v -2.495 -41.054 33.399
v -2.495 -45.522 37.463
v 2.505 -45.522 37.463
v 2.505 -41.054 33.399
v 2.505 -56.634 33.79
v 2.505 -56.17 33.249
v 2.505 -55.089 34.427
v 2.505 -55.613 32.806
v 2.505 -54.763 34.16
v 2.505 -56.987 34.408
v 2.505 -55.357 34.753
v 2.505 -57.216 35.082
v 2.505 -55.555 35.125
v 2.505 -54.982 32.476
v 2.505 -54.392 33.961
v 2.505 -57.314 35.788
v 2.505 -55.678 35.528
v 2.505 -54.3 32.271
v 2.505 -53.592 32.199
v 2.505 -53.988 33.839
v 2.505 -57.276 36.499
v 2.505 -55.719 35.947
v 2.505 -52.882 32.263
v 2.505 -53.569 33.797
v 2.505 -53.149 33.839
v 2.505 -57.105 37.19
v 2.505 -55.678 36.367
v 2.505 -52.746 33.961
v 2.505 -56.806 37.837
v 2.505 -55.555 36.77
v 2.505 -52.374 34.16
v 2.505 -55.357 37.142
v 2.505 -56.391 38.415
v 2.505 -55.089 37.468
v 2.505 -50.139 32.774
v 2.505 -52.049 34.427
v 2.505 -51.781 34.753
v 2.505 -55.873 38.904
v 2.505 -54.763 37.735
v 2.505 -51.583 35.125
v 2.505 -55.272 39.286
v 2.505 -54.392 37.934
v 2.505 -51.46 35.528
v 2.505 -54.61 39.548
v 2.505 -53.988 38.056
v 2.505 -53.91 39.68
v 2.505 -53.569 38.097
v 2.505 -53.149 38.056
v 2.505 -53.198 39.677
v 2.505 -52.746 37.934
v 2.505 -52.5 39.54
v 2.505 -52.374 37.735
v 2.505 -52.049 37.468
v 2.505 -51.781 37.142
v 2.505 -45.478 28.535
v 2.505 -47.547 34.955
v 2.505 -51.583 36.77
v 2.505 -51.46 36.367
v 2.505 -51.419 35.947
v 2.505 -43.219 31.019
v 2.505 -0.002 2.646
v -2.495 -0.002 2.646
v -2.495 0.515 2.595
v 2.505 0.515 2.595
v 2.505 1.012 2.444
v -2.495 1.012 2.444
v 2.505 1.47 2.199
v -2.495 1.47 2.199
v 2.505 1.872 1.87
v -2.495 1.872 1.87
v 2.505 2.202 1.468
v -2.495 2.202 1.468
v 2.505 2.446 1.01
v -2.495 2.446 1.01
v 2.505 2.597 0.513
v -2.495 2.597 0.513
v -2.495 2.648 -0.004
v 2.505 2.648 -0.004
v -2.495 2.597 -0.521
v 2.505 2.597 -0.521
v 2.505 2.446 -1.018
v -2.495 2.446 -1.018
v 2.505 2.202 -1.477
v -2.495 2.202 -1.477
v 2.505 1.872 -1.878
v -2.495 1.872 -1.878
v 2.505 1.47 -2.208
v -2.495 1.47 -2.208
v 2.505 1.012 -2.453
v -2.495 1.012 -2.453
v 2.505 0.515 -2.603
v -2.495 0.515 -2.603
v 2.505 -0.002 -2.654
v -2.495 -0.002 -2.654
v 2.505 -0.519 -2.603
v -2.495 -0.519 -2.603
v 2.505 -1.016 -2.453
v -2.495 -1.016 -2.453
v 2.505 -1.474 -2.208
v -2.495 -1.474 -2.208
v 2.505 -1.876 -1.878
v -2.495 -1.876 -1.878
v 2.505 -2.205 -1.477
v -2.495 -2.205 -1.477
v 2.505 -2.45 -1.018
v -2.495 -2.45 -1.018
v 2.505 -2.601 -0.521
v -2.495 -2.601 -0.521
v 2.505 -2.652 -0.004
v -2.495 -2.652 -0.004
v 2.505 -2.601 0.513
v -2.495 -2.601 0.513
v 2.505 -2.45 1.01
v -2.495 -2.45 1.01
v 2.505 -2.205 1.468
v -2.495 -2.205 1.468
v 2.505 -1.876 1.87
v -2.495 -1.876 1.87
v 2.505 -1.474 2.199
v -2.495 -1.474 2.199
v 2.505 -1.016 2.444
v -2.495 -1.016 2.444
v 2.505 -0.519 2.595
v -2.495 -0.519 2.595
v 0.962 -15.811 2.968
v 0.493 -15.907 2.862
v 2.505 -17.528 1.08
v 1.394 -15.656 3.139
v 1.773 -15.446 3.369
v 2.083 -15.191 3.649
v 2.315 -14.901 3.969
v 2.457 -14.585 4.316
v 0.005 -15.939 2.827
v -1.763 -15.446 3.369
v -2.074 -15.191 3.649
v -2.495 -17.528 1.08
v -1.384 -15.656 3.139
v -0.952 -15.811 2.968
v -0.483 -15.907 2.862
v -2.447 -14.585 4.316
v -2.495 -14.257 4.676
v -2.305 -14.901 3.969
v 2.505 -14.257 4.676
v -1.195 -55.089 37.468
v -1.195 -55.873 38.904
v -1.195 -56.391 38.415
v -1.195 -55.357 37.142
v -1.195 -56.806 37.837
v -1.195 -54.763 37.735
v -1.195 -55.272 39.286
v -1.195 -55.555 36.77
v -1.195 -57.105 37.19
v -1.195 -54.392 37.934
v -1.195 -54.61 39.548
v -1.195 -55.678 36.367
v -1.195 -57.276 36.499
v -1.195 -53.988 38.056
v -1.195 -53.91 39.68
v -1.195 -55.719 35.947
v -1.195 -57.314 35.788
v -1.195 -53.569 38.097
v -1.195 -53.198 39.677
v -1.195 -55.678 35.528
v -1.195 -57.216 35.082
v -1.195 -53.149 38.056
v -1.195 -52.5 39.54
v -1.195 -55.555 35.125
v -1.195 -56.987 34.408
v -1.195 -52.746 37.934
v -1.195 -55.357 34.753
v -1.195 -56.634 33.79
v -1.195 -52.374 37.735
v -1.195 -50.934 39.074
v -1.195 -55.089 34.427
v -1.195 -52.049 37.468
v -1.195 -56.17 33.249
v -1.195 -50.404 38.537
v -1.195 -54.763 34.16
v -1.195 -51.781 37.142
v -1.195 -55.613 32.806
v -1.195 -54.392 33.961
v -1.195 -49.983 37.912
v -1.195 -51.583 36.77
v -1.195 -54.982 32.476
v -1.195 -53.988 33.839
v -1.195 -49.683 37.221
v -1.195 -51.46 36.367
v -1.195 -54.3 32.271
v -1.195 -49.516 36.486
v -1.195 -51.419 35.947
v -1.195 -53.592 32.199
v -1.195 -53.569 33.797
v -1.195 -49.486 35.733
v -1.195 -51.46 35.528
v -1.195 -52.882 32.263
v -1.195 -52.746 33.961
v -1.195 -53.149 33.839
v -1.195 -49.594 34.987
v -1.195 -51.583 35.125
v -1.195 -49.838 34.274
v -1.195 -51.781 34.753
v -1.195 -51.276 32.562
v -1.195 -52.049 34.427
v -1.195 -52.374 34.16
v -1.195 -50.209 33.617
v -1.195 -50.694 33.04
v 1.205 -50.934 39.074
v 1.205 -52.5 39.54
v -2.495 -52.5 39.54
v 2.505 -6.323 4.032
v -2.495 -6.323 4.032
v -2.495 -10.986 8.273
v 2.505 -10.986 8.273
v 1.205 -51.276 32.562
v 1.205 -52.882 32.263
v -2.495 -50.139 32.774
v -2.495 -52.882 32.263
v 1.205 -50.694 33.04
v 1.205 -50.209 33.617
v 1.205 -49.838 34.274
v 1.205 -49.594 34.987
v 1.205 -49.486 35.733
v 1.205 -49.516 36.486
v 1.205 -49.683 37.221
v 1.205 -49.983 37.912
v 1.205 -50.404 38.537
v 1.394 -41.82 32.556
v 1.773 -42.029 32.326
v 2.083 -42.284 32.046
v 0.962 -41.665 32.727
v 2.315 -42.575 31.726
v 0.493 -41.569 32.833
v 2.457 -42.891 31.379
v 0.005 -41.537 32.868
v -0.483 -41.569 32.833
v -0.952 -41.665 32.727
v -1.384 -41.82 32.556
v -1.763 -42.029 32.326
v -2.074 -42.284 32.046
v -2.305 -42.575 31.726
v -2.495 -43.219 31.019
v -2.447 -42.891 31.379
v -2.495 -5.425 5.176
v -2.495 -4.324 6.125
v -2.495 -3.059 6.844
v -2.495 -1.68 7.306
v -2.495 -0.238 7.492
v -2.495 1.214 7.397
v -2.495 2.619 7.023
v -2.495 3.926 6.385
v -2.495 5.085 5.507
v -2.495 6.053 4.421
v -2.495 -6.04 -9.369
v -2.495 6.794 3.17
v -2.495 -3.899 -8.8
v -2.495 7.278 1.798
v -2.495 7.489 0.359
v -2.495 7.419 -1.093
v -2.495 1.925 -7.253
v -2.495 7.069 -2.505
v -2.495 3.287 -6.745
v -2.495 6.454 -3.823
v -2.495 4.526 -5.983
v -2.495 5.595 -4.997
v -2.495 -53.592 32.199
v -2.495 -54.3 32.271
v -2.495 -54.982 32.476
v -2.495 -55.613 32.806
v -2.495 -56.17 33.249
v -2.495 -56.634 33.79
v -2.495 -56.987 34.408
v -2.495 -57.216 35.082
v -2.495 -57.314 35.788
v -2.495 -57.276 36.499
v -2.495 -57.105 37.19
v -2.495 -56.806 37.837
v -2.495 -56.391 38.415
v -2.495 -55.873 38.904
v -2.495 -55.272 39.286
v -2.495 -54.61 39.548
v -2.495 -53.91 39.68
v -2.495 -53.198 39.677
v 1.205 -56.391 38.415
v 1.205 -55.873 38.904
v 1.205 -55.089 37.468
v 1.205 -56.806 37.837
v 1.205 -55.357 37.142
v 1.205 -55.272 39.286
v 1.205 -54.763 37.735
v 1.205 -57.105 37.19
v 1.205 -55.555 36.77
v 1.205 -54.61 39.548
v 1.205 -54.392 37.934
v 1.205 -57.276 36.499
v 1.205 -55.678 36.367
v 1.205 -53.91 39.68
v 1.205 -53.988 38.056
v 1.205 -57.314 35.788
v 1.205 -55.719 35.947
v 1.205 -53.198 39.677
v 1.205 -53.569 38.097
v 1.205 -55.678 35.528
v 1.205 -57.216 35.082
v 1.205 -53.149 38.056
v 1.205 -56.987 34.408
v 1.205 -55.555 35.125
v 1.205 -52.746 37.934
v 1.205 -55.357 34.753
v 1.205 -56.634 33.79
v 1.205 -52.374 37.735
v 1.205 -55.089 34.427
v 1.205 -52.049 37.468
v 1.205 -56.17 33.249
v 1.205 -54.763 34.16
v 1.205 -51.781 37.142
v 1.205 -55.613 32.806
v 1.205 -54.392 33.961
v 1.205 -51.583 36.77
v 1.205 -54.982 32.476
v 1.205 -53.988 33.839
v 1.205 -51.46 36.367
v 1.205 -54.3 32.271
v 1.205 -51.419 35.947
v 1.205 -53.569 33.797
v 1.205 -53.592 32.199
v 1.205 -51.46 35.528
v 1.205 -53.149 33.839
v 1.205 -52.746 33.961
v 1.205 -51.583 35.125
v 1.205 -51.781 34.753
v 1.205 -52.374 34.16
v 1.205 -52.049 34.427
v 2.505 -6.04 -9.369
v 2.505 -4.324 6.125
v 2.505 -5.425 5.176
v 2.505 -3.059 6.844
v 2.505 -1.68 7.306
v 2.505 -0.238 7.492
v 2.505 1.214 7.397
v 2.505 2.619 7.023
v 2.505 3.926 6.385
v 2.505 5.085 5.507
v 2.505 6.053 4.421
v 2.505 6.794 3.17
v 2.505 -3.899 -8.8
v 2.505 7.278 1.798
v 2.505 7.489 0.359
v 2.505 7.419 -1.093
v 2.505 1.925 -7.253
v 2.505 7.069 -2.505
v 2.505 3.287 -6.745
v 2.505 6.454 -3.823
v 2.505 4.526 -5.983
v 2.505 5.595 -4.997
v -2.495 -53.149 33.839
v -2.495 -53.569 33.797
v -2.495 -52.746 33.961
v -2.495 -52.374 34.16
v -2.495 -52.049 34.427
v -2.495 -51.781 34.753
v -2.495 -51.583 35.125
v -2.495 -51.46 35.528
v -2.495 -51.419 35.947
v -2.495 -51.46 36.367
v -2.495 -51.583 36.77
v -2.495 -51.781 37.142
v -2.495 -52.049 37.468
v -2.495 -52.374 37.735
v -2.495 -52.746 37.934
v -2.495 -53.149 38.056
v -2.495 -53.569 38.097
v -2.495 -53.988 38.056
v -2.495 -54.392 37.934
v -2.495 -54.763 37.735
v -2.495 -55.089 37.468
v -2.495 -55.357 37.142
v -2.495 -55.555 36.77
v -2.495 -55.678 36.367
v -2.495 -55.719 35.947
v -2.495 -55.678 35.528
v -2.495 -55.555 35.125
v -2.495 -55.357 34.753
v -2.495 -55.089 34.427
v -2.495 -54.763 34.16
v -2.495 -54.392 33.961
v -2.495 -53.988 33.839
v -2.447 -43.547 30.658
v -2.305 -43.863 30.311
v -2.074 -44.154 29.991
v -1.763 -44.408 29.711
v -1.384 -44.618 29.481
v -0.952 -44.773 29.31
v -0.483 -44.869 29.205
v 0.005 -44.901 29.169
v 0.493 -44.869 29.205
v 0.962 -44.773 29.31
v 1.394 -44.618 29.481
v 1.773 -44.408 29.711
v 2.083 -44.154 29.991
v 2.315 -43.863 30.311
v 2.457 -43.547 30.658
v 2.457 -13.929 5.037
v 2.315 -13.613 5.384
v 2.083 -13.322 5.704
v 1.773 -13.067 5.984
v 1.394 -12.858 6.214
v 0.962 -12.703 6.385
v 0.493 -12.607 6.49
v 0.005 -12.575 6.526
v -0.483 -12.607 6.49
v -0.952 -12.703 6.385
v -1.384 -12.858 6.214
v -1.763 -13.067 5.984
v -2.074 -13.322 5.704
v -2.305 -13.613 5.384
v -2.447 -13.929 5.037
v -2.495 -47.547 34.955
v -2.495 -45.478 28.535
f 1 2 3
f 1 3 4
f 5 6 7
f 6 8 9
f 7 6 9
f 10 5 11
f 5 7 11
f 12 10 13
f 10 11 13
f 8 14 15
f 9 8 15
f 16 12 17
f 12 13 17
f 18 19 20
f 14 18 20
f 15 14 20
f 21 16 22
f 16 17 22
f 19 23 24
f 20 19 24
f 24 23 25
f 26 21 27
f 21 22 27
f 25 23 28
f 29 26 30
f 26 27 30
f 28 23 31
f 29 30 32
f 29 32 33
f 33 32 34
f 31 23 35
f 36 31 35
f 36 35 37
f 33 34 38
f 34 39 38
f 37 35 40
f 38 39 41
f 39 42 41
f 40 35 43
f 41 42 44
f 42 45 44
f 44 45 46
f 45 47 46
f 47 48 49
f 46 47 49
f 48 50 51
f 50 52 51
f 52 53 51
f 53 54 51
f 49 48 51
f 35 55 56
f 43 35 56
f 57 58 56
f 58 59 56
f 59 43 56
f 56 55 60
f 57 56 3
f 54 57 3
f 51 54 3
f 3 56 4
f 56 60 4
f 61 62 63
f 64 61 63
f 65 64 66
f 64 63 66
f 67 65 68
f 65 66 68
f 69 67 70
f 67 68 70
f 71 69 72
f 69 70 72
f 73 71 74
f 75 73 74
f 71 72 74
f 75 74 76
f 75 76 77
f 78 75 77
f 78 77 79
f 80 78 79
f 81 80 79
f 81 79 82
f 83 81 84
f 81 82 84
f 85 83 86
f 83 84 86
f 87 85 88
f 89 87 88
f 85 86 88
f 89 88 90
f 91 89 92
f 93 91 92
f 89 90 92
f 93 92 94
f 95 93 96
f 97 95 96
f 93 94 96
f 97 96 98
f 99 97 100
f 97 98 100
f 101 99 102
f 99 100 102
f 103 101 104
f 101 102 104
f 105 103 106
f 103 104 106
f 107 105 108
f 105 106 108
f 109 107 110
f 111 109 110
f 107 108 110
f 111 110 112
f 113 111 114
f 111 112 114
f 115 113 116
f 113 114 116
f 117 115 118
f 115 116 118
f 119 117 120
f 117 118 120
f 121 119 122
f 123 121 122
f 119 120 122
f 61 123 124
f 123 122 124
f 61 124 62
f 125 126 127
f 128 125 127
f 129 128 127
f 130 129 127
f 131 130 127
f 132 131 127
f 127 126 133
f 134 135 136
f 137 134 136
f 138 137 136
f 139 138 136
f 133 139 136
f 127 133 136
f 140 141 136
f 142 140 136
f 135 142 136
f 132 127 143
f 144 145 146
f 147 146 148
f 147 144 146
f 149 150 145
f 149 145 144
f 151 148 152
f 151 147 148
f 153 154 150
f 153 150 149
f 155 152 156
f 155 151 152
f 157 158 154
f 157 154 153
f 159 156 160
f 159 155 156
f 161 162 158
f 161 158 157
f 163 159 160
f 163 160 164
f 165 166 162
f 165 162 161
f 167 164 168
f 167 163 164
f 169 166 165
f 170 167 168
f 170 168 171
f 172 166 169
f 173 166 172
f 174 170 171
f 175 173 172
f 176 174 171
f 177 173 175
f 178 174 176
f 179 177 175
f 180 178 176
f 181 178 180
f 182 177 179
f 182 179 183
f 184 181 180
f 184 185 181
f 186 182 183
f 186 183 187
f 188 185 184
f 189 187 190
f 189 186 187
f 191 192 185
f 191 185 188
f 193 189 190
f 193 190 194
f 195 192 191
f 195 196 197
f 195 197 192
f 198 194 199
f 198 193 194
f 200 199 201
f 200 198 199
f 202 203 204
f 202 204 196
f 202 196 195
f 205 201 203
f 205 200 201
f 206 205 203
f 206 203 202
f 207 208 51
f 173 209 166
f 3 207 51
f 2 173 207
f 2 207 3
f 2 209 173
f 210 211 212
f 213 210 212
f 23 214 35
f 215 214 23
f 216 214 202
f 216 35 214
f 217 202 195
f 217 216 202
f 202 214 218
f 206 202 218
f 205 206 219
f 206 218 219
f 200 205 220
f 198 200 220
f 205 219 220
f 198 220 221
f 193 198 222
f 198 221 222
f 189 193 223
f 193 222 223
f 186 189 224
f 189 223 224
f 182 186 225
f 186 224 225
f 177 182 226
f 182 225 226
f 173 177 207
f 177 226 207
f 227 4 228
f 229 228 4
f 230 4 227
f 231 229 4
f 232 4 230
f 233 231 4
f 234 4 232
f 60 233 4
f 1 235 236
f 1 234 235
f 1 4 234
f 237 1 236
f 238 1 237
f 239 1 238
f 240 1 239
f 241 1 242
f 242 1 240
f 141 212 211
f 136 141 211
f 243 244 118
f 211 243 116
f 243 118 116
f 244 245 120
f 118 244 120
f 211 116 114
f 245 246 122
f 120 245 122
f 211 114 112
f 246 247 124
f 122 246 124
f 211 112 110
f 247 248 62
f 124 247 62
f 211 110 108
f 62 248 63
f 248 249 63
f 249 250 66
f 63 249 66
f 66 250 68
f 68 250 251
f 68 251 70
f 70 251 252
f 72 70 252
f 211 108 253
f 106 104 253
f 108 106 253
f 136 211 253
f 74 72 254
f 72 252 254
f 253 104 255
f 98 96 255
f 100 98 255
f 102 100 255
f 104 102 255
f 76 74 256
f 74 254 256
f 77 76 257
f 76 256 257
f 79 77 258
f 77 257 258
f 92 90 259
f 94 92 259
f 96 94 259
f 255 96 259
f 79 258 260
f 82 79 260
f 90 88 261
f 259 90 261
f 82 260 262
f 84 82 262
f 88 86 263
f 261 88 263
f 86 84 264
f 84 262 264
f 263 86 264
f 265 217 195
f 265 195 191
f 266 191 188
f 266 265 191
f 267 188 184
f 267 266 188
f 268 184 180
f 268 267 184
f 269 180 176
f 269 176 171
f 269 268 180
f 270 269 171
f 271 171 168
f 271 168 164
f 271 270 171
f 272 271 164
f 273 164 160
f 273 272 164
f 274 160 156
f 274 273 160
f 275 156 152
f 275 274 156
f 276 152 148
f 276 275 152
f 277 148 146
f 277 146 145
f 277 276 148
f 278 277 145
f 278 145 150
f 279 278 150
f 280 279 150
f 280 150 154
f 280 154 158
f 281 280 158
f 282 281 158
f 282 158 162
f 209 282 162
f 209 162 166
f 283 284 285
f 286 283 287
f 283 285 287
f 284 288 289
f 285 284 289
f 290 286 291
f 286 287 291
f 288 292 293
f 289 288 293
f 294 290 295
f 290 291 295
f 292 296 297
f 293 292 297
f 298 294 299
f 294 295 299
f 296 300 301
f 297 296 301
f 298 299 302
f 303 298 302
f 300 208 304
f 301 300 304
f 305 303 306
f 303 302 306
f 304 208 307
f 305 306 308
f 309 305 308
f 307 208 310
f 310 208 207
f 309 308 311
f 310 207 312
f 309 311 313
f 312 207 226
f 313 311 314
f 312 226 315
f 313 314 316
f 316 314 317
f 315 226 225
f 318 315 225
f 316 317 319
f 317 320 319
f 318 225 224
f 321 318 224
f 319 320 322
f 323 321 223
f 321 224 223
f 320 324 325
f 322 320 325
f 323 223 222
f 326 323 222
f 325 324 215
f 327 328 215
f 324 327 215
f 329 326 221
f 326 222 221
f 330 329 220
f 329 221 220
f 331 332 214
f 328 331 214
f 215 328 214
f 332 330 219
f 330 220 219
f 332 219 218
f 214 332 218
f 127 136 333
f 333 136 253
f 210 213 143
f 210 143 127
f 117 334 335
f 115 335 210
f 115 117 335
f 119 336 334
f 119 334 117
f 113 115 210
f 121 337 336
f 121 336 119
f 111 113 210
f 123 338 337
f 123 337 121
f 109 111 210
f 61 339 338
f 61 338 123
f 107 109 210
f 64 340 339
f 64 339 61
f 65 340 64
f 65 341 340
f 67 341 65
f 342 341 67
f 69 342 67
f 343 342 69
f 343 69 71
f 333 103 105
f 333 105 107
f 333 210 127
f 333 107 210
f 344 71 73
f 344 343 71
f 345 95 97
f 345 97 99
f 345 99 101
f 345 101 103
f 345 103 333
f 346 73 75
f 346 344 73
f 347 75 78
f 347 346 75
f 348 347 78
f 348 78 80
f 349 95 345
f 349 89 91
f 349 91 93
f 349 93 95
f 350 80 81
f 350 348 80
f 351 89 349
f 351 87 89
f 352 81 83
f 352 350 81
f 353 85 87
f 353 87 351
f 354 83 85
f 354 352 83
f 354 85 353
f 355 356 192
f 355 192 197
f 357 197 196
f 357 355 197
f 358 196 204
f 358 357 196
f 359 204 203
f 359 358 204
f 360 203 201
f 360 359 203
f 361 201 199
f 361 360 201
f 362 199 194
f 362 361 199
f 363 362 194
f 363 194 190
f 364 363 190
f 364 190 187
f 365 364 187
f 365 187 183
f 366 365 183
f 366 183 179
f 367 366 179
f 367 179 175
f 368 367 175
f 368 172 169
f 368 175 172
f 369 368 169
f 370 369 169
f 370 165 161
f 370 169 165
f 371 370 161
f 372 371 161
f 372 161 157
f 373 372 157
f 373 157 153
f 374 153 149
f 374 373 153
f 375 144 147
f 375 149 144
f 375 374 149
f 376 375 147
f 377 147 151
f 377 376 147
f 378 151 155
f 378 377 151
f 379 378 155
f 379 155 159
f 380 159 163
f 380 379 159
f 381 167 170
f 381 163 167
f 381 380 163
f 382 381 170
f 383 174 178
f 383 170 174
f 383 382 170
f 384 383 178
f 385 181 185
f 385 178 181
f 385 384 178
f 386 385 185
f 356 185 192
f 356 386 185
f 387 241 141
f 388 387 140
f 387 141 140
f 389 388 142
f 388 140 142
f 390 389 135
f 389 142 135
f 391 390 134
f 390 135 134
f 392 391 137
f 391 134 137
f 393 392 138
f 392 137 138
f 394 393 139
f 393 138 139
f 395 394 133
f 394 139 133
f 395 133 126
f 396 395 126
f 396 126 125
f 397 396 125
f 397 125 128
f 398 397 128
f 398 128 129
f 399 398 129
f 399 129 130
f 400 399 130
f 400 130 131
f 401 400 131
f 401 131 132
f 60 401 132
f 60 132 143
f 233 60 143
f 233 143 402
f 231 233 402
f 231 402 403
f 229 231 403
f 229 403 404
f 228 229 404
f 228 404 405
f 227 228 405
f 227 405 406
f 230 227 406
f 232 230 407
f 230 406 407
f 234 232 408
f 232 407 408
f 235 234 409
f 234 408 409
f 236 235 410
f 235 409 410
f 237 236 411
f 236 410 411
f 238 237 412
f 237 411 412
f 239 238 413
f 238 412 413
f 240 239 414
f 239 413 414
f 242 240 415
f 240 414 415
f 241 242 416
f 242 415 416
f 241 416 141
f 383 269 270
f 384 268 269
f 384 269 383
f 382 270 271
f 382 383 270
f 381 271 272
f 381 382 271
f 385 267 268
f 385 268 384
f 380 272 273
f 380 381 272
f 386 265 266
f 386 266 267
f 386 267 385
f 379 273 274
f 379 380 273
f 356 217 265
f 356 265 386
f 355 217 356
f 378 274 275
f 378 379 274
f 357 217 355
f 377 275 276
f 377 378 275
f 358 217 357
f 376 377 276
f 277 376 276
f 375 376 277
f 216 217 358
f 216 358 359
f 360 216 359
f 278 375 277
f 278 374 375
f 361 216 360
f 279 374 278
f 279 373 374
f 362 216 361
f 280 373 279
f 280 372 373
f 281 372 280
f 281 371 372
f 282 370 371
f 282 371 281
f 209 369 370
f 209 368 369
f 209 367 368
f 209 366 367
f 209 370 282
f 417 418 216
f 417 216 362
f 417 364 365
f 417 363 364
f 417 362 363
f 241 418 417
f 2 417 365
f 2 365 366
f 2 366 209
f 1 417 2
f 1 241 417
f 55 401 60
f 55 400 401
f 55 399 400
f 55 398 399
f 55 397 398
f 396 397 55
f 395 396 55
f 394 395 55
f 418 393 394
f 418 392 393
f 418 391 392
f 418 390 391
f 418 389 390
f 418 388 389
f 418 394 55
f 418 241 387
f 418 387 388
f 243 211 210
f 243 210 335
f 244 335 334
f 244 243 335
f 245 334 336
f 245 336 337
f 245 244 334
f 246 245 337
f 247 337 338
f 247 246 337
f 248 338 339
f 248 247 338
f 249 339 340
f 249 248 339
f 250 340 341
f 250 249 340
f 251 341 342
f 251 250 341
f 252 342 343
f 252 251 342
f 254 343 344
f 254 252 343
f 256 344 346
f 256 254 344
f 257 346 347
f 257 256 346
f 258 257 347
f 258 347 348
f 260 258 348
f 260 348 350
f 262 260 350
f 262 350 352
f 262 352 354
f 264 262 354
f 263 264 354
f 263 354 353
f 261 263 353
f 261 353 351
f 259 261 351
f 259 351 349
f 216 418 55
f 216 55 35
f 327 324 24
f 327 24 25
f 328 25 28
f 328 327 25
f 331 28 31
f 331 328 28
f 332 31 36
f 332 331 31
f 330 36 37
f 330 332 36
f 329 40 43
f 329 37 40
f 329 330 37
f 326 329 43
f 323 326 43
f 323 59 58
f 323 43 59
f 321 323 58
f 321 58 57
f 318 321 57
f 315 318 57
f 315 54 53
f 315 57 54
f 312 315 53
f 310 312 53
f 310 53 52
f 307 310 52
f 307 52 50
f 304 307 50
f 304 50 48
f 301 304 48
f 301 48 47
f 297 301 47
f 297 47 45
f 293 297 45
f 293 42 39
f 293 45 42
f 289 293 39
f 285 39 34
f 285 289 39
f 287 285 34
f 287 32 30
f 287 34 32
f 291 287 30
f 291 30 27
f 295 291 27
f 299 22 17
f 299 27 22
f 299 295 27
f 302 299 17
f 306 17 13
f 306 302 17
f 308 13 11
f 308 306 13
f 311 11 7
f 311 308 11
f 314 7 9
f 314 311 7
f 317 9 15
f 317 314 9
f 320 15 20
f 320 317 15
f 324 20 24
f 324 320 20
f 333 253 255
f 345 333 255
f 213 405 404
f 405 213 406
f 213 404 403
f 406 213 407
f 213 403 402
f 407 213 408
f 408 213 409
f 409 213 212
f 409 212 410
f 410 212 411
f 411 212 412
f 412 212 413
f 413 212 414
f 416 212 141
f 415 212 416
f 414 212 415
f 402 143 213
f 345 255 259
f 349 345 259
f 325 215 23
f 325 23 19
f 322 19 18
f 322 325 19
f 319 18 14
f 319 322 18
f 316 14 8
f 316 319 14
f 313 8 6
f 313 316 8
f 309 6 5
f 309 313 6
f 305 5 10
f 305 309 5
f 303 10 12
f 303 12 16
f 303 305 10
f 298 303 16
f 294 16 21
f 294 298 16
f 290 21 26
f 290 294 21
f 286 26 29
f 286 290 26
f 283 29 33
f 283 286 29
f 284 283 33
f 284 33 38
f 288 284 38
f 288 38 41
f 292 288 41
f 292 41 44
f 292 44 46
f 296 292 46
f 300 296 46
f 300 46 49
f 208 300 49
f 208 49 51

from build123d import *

# Parameters (mm, degrees)
SKETCH2_R               = 7.5
SKETCH2_R_2             = 2.65
BOSS_EXTRUDE1_DEPTH     = 5
BOSS_EXTRUDE2_DEPTH     = 5
SKETCH4_R               = 2.5
BOSS_EXTRUDE3_DEPTH     = 45
BOSS_EXTRUDE4_DEPTH     = 5
CUT_EXTRUDE1_DEPTH      = 116.323136372
CUT_EXTRUDE1_DEPTH_BACK = 116.323136372
SKETCH6_R               = 2.15
SKETCH7_R               = 4.088958129
CUT_EXTRUDE2_DEPTH      = 1.2


with BuildPart() as part:
    # Sketch2 → Boss-Extrude1 (new body)
    with BuildSketch(Plane.ZY.offset(-18.504809472)):
        with Locations((-0.354303453, 100.78821716)):
            Circle(SKETCH2_R)
        with Locations((-0.354303453, 100.78821716)):
            Circle(SKETCH2_R_2, mode=Mode.SUBTRACT)
    extrude(amount=-BOSS_EXTRUDE1_DEPTH)

    # Sketch3 → Boss-Extrude2 (add)
    with BuildSketch(Plane.ZY.offset(-18.504809472)):
        Polygon((-9.150423673, 96.891429681), (-7.602645922, 102.714750693), (0.936612358, 94.575063583), (3.681899885, 94.466899053), (7.922814088, 89.804236476), (0.729824207, 83.261868795), (-9.719499705, 94.750351991), align=None)
    extrude(amount=-BOSS_EXTRUDE2_DEPTH)

    # Sketch4 → Boss-Extrude3 (add)
    with BuildSketch(Plane(origin=(0, 45.202809873, -41.114113503), x_dir=(1, 0, 0), z_dir=(0, -0.7397718400154494, 0.6728578042351567))):
        with Locations(Location((21.004809472, 61.424928866, 0), (0, 0, 180))):
            Circle(SKETCH4_R)
    extrude(amount=BOSS_EXTRUDE3_DEPTH)

    # Sketch5 → Boss-Extrude4 (add)
    with BuildSketch(Plane.ZY.offset(-18.504809472)):
        with BuildLine():
            Line((39.189983074, 48.290417188), (37.112992328, 55.268407542))
            Line((37.112992328, 55.268407542), (33.049229829, 59.736301118))
            Line((33.049229829, 59.736301118), (28.184844411, 55.311910361))
            Line((28.184844411, 55.311910361), (32.423819526, 50.65137971))
            Line((32.423819526, 50.65137971), (31.912552769, 47.90776949))
            ThreePointArc((31.912552769, 47.90776949), (35.794247616, 43.477955415), (39.189983074, 48.290417188))
        make_face()
    extrude(amount=-BOSS_EXTRUDE4_DEPTH)

    # Sketch6 → Cut-Extrude1 (cut, two sides: drawn at the far end of the back side and taken through both)
    with BuildSketch(Plane(origin=(23.504809472, 0, 0), x_dir=(0, 0, -1), z_dir=(1, 0, 0)).offset(-CUT_EXTRUDE1_DEPTH_BACK)):
        with Locations((-35.597432924, 47.221098797)):
            Circle(SKETCH6_R)
    extrude(amount=CUT_EXTRUDE1_DEPTH + CUT_EXTRUDE1_DEPTH_BACK, mode=Mode.SUBTRACT)

    # Sketch7 → Cut-Extrude2 (cut, symmetric)
    with BuildSketch(Plane(origin=(21.004809472, 0, 0), x_dir=(0, 0, -1), z_dir=(1, 0, 0))):
        with Locations((-35.597432924, 47.221098797)):
            Circle(SKETCH7_R)
    extrude(amount=CUT_EXTRUDE2_DEPTH, both=True, mode=Mode.SUBTRACT)


with BuildPart() as part_1:
    # Body-Move/Copy1: moved
    add(part.part.moved(Location((-21, -100.79, 0.35))))


solid = part_1.part
